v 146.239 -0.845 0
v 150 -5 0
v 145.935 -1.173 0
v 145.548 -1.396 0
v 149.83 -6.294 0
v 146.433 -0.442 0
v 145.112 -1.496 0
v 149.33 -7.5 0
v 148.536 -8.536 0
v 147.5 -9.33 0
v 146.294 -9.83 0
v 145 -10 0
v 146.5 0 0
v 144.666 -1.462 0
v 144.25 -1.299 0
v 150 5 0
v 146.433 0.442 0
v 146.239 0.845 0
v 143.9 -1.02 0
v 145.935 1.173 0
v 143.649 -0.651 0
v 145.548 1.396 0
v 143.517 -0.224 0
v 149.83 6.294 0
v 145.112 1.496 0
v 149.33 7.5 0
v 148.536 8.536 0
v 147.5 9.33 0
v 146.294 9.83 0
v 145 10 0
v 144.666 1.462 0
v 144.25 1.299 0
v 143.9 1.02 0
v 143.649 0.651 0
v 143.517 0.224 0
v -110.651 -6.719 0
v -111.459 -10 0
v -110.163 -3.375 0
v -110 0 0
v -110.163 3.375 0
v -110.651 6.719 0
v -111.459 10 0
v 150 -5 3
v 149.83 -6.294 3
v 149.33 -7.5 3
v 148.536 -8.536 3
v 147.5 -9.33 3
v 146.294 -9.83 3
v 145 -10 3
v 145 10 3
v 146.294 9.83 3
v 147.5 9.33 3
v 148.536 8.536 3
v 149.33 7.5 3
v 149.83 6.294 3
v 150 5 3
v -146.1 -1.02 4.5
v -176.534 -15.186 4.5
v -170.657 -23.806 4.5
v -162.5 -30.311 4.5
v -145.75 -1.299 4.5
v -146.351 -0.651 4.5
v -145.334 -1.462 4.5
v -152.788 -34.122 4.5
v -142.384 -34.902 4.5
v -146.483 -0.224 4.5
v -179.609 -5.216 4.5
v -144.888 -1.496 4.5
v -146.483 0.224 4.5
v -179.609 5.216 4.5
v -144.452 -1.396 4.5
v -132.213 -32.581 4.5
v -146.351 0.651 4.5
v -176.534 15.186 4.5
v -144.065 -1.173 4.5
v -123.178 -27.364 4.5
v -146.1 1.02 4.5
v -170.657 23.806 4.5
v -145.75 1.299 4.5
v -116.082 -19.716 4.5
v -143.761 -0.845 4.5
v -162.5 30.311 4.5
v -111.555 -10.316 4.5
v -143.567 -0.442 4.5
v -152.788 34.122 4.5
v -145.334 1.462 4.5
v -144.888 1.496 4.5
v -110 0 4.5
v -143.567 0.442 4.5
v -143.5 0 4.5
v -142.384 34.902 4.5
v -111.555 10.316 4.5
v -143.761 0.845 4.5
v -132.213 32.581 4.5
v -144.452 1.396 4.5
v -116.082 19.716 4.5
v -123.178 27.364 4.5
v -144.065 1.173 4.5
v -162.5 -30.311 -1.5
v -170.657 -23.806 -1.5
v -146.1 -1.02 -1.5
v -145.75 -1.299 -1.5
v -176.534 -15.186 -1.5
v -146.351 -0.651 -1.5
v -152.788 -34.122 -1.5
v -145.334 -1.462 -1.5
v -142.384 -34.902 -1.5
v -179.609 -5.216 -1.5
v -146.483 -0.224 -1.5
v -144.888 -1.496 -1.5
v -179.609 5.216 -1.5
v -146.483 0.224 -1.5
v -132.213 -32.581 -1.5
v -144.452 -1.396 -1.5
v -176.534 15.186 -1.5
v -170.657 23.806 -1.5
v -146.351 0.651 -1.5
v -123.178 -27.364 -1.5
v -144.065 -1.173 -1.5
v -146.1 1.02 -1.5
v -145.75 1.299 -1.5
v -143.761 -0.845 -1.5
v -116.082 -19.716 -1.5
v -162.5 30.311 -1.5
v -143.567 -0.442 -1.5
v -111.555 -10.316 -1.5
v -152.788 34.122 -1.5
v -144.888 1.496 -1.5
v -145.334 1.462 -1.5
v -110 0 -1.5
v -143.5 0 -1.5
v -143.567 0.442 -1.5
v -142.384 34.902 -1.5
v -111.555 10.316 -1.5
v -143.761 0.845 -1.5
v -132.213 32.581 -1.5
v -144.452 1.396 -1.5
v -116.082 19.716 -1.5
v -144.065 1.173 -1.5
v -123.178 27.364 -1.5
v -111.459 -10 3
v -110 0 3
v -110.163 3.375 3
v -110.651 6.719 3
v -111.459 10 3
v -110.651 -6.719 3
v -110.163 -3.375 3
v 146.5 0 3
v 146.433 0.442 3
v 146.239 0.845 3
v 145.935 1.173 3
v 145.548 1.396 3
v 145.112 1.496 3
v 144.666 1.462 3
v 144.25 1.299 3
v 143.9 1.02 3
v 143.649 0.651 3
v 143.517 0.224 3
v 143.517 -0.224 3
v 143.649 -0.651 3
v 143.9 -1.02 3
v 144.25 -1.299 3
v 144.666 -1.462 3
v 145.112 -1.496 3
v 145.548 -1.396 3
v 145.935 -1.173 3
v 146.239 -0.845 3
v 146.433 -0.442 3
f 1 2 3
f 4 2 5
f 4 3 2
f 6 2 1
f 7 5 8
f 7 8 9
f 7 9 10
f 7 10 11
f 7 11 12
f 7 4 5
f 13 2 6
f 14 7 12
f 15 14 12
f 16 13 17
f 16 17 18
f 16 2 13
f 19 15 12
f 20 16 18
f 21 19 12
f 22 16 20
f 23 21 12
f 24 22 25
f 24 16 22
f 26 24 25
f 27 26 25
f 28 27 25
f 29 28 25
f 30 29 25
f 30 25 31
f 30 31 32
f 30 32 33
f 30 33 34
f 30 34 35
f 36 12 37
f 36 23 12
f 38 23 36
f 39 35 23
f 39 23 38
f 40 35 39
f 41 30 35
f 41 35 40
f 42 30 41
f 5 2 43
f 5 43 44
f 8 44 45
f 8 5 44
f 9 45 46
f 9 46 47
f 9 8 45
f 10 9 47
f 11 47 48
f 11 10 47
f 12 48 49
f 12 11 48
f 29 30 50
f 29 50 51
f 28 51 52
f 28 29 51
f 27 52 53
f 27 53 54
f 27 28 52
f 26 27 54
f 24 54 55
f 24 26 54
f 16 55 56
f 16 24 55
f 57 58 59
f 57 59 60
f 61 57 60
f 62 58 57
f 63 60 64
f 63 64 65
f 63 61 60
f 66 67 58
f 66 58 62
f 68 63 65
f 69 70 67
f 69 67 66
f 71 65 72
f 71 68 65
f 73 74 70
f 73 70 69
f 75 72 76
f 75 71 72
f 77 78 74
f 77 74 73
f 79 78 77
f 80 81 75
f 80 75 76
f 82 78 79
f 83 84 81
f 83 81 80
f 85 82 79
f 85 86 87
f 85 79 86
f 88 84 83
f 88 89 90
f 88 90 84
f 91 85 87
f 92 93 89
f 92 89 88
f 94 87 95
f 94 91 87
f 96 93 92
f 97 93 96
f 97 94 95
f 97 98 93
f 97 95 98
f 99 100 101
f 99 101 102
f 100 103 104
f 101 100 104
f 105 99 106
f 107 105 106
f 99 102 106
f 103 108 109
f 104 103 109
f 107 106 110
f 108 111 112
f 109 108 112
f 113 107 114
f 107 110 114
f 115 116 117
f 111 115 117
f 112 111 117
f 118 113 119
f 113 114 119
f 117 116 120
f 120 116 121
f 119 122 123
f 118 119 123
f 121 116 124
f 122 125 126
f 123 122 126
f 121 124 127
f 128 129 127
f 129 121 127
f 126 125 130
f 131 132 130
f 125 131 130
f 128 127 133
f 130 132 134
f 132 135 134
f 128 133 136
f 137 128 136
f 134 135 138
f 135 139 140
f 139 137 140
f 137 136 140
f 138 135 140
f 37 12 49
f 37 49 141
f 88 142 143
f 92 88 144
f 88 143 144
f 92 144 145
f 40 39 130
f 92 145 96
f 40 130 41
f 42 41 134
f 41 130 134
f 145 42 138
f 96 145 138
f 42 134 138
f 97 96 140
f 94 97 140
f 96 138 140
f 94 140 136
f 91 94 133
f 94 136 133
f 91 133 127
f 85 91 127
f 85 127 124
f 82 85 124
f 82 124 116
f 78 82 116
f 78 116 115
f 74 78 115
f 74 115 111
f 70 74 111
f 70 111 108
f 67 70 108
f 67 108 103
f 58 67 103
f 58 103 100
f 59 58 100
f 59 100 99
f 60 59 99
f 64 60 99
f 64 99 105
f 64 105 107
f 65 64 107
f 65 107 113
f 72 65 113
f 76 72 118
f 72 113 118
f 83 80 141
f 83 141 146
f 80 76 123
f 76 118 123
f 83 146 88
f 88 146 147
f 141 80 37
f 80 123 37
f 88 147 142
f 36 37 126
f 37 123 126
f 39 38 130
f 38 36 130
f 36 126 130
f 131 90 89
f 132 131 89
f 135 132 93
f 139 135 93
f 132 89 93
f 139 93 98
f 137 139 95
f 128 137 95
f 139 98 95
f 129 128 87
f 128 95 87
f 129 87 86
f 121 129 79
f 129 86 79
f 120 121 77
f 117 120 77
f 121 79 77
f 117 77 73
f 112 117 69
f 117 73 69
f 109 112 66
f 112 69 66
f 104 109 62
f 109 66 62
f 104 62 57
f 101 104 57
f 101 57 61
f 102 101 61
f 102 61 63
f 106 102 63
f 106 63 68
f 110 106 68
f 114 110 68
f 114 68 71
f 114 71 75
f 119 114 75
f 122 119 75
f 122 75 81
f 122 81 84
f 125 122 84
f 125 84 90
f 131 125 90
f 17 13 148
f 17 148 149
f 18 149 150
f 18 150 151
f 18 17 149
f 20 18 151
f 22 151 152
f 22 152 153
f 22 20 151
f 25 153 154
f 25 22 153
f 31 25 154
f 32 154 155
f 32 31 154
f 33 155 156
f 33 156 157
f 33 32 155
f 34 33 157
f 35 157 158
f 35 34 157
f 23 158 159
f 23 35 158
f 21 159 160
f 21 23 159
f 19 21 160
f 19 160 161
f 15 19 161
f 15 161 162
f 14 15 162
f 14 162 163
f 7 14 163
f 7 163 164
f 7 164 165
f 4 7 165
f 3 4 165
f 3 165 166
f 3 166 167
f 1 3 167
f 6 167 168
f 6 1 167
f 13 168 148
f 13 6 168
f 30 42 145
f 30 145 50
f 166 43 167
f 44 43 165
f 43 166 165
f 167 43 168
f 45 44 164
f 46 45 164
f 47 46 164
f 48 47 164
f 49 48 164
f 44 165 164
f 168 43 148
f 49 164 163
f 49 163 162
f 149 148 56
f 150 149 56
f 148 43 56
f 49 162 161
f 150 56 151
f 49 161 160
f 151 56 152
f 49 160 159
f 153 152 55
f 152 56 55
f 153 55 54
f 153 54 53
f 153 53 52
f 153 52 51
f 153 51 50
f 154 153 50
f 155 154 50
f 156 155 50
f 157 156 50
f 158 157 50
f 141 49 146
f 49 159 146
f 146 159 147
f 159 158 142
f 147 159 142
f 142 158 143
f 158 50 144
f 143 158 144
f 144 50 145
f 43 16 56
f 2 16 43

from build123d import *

# Parameters (mm, degrees)
SKETCH1_R                = 1.5
BOSS_EXTRUDE1_DEPTH      = 3
BOSS_EXTRUDE2_DEPTH      = 3
BOSS_EXTRUDE2_DEPTH_BACK = 3
BOSS_EXTRUDE2_START      = 1.5
SKETCH4_R                = 35
SKETCH9_R                = 1.5
CUT_EXTRUDE1_DEPTH       = 184.469343488


with BuildPart() as part:
    # Sketch1 → Boss-Extrude1 (new body)
    with BuildSketch(Plane.XY):
        with BuildLine():
            Line((-145, 10), (145, 10))
            ThreePointArc((145, 10), (148.535533906, 8.535533906), (150, 5))
            Line((150, 5), (150, -5))
            ThreePointArc((150, -5), (148.535533906, -8.535533906), (145, -10))
            Line((145, -10), (-145, -10))
            ThreePointArc((-145, -10), (-148.535533906, -8.535533906), (-150, -5))
            Line((-150, -5), (-150, 5))
            ThreePointArc((-150, 5), (-148.535533906, 8.535533906), (-145, 10))
        make_face()
        with Locations((145, 0)):
            Circle(SKETCH1_R, mode=Mode.SUBTRACT)
    extrude(amount=BOSS_EXTRUDE1_DEPTH)

    # Sketch4 → Boss-Extrude2 (add, two sides: drawn at the far end of the back side and taken through both)
    with BuildSketch(Plane.XY.offset(BOSS_EXTRUDE2_START - BOSS_EXTRUDE2_DEPTH_BACK)):
        with Locations((-145, 0)):
            Circle(SKETCH4_R)
    extrude(amount=BOSS_EXTRUDE2_DEPTH + BOSS_EXTRUDE2_DEPTH_BACK)

    # Sketch9 → Cut-Extrude1 (cut, through all)
    with BuildSketch(Plane.XY.offset(4.5)):
        with Locations((-145, 0)):
            Circle(SKETCH9_R)
    extrude(amount=-CUT_EXTRUDE1_DEPTH, mode=Mode.SUBTRACT)


solid = part.part
